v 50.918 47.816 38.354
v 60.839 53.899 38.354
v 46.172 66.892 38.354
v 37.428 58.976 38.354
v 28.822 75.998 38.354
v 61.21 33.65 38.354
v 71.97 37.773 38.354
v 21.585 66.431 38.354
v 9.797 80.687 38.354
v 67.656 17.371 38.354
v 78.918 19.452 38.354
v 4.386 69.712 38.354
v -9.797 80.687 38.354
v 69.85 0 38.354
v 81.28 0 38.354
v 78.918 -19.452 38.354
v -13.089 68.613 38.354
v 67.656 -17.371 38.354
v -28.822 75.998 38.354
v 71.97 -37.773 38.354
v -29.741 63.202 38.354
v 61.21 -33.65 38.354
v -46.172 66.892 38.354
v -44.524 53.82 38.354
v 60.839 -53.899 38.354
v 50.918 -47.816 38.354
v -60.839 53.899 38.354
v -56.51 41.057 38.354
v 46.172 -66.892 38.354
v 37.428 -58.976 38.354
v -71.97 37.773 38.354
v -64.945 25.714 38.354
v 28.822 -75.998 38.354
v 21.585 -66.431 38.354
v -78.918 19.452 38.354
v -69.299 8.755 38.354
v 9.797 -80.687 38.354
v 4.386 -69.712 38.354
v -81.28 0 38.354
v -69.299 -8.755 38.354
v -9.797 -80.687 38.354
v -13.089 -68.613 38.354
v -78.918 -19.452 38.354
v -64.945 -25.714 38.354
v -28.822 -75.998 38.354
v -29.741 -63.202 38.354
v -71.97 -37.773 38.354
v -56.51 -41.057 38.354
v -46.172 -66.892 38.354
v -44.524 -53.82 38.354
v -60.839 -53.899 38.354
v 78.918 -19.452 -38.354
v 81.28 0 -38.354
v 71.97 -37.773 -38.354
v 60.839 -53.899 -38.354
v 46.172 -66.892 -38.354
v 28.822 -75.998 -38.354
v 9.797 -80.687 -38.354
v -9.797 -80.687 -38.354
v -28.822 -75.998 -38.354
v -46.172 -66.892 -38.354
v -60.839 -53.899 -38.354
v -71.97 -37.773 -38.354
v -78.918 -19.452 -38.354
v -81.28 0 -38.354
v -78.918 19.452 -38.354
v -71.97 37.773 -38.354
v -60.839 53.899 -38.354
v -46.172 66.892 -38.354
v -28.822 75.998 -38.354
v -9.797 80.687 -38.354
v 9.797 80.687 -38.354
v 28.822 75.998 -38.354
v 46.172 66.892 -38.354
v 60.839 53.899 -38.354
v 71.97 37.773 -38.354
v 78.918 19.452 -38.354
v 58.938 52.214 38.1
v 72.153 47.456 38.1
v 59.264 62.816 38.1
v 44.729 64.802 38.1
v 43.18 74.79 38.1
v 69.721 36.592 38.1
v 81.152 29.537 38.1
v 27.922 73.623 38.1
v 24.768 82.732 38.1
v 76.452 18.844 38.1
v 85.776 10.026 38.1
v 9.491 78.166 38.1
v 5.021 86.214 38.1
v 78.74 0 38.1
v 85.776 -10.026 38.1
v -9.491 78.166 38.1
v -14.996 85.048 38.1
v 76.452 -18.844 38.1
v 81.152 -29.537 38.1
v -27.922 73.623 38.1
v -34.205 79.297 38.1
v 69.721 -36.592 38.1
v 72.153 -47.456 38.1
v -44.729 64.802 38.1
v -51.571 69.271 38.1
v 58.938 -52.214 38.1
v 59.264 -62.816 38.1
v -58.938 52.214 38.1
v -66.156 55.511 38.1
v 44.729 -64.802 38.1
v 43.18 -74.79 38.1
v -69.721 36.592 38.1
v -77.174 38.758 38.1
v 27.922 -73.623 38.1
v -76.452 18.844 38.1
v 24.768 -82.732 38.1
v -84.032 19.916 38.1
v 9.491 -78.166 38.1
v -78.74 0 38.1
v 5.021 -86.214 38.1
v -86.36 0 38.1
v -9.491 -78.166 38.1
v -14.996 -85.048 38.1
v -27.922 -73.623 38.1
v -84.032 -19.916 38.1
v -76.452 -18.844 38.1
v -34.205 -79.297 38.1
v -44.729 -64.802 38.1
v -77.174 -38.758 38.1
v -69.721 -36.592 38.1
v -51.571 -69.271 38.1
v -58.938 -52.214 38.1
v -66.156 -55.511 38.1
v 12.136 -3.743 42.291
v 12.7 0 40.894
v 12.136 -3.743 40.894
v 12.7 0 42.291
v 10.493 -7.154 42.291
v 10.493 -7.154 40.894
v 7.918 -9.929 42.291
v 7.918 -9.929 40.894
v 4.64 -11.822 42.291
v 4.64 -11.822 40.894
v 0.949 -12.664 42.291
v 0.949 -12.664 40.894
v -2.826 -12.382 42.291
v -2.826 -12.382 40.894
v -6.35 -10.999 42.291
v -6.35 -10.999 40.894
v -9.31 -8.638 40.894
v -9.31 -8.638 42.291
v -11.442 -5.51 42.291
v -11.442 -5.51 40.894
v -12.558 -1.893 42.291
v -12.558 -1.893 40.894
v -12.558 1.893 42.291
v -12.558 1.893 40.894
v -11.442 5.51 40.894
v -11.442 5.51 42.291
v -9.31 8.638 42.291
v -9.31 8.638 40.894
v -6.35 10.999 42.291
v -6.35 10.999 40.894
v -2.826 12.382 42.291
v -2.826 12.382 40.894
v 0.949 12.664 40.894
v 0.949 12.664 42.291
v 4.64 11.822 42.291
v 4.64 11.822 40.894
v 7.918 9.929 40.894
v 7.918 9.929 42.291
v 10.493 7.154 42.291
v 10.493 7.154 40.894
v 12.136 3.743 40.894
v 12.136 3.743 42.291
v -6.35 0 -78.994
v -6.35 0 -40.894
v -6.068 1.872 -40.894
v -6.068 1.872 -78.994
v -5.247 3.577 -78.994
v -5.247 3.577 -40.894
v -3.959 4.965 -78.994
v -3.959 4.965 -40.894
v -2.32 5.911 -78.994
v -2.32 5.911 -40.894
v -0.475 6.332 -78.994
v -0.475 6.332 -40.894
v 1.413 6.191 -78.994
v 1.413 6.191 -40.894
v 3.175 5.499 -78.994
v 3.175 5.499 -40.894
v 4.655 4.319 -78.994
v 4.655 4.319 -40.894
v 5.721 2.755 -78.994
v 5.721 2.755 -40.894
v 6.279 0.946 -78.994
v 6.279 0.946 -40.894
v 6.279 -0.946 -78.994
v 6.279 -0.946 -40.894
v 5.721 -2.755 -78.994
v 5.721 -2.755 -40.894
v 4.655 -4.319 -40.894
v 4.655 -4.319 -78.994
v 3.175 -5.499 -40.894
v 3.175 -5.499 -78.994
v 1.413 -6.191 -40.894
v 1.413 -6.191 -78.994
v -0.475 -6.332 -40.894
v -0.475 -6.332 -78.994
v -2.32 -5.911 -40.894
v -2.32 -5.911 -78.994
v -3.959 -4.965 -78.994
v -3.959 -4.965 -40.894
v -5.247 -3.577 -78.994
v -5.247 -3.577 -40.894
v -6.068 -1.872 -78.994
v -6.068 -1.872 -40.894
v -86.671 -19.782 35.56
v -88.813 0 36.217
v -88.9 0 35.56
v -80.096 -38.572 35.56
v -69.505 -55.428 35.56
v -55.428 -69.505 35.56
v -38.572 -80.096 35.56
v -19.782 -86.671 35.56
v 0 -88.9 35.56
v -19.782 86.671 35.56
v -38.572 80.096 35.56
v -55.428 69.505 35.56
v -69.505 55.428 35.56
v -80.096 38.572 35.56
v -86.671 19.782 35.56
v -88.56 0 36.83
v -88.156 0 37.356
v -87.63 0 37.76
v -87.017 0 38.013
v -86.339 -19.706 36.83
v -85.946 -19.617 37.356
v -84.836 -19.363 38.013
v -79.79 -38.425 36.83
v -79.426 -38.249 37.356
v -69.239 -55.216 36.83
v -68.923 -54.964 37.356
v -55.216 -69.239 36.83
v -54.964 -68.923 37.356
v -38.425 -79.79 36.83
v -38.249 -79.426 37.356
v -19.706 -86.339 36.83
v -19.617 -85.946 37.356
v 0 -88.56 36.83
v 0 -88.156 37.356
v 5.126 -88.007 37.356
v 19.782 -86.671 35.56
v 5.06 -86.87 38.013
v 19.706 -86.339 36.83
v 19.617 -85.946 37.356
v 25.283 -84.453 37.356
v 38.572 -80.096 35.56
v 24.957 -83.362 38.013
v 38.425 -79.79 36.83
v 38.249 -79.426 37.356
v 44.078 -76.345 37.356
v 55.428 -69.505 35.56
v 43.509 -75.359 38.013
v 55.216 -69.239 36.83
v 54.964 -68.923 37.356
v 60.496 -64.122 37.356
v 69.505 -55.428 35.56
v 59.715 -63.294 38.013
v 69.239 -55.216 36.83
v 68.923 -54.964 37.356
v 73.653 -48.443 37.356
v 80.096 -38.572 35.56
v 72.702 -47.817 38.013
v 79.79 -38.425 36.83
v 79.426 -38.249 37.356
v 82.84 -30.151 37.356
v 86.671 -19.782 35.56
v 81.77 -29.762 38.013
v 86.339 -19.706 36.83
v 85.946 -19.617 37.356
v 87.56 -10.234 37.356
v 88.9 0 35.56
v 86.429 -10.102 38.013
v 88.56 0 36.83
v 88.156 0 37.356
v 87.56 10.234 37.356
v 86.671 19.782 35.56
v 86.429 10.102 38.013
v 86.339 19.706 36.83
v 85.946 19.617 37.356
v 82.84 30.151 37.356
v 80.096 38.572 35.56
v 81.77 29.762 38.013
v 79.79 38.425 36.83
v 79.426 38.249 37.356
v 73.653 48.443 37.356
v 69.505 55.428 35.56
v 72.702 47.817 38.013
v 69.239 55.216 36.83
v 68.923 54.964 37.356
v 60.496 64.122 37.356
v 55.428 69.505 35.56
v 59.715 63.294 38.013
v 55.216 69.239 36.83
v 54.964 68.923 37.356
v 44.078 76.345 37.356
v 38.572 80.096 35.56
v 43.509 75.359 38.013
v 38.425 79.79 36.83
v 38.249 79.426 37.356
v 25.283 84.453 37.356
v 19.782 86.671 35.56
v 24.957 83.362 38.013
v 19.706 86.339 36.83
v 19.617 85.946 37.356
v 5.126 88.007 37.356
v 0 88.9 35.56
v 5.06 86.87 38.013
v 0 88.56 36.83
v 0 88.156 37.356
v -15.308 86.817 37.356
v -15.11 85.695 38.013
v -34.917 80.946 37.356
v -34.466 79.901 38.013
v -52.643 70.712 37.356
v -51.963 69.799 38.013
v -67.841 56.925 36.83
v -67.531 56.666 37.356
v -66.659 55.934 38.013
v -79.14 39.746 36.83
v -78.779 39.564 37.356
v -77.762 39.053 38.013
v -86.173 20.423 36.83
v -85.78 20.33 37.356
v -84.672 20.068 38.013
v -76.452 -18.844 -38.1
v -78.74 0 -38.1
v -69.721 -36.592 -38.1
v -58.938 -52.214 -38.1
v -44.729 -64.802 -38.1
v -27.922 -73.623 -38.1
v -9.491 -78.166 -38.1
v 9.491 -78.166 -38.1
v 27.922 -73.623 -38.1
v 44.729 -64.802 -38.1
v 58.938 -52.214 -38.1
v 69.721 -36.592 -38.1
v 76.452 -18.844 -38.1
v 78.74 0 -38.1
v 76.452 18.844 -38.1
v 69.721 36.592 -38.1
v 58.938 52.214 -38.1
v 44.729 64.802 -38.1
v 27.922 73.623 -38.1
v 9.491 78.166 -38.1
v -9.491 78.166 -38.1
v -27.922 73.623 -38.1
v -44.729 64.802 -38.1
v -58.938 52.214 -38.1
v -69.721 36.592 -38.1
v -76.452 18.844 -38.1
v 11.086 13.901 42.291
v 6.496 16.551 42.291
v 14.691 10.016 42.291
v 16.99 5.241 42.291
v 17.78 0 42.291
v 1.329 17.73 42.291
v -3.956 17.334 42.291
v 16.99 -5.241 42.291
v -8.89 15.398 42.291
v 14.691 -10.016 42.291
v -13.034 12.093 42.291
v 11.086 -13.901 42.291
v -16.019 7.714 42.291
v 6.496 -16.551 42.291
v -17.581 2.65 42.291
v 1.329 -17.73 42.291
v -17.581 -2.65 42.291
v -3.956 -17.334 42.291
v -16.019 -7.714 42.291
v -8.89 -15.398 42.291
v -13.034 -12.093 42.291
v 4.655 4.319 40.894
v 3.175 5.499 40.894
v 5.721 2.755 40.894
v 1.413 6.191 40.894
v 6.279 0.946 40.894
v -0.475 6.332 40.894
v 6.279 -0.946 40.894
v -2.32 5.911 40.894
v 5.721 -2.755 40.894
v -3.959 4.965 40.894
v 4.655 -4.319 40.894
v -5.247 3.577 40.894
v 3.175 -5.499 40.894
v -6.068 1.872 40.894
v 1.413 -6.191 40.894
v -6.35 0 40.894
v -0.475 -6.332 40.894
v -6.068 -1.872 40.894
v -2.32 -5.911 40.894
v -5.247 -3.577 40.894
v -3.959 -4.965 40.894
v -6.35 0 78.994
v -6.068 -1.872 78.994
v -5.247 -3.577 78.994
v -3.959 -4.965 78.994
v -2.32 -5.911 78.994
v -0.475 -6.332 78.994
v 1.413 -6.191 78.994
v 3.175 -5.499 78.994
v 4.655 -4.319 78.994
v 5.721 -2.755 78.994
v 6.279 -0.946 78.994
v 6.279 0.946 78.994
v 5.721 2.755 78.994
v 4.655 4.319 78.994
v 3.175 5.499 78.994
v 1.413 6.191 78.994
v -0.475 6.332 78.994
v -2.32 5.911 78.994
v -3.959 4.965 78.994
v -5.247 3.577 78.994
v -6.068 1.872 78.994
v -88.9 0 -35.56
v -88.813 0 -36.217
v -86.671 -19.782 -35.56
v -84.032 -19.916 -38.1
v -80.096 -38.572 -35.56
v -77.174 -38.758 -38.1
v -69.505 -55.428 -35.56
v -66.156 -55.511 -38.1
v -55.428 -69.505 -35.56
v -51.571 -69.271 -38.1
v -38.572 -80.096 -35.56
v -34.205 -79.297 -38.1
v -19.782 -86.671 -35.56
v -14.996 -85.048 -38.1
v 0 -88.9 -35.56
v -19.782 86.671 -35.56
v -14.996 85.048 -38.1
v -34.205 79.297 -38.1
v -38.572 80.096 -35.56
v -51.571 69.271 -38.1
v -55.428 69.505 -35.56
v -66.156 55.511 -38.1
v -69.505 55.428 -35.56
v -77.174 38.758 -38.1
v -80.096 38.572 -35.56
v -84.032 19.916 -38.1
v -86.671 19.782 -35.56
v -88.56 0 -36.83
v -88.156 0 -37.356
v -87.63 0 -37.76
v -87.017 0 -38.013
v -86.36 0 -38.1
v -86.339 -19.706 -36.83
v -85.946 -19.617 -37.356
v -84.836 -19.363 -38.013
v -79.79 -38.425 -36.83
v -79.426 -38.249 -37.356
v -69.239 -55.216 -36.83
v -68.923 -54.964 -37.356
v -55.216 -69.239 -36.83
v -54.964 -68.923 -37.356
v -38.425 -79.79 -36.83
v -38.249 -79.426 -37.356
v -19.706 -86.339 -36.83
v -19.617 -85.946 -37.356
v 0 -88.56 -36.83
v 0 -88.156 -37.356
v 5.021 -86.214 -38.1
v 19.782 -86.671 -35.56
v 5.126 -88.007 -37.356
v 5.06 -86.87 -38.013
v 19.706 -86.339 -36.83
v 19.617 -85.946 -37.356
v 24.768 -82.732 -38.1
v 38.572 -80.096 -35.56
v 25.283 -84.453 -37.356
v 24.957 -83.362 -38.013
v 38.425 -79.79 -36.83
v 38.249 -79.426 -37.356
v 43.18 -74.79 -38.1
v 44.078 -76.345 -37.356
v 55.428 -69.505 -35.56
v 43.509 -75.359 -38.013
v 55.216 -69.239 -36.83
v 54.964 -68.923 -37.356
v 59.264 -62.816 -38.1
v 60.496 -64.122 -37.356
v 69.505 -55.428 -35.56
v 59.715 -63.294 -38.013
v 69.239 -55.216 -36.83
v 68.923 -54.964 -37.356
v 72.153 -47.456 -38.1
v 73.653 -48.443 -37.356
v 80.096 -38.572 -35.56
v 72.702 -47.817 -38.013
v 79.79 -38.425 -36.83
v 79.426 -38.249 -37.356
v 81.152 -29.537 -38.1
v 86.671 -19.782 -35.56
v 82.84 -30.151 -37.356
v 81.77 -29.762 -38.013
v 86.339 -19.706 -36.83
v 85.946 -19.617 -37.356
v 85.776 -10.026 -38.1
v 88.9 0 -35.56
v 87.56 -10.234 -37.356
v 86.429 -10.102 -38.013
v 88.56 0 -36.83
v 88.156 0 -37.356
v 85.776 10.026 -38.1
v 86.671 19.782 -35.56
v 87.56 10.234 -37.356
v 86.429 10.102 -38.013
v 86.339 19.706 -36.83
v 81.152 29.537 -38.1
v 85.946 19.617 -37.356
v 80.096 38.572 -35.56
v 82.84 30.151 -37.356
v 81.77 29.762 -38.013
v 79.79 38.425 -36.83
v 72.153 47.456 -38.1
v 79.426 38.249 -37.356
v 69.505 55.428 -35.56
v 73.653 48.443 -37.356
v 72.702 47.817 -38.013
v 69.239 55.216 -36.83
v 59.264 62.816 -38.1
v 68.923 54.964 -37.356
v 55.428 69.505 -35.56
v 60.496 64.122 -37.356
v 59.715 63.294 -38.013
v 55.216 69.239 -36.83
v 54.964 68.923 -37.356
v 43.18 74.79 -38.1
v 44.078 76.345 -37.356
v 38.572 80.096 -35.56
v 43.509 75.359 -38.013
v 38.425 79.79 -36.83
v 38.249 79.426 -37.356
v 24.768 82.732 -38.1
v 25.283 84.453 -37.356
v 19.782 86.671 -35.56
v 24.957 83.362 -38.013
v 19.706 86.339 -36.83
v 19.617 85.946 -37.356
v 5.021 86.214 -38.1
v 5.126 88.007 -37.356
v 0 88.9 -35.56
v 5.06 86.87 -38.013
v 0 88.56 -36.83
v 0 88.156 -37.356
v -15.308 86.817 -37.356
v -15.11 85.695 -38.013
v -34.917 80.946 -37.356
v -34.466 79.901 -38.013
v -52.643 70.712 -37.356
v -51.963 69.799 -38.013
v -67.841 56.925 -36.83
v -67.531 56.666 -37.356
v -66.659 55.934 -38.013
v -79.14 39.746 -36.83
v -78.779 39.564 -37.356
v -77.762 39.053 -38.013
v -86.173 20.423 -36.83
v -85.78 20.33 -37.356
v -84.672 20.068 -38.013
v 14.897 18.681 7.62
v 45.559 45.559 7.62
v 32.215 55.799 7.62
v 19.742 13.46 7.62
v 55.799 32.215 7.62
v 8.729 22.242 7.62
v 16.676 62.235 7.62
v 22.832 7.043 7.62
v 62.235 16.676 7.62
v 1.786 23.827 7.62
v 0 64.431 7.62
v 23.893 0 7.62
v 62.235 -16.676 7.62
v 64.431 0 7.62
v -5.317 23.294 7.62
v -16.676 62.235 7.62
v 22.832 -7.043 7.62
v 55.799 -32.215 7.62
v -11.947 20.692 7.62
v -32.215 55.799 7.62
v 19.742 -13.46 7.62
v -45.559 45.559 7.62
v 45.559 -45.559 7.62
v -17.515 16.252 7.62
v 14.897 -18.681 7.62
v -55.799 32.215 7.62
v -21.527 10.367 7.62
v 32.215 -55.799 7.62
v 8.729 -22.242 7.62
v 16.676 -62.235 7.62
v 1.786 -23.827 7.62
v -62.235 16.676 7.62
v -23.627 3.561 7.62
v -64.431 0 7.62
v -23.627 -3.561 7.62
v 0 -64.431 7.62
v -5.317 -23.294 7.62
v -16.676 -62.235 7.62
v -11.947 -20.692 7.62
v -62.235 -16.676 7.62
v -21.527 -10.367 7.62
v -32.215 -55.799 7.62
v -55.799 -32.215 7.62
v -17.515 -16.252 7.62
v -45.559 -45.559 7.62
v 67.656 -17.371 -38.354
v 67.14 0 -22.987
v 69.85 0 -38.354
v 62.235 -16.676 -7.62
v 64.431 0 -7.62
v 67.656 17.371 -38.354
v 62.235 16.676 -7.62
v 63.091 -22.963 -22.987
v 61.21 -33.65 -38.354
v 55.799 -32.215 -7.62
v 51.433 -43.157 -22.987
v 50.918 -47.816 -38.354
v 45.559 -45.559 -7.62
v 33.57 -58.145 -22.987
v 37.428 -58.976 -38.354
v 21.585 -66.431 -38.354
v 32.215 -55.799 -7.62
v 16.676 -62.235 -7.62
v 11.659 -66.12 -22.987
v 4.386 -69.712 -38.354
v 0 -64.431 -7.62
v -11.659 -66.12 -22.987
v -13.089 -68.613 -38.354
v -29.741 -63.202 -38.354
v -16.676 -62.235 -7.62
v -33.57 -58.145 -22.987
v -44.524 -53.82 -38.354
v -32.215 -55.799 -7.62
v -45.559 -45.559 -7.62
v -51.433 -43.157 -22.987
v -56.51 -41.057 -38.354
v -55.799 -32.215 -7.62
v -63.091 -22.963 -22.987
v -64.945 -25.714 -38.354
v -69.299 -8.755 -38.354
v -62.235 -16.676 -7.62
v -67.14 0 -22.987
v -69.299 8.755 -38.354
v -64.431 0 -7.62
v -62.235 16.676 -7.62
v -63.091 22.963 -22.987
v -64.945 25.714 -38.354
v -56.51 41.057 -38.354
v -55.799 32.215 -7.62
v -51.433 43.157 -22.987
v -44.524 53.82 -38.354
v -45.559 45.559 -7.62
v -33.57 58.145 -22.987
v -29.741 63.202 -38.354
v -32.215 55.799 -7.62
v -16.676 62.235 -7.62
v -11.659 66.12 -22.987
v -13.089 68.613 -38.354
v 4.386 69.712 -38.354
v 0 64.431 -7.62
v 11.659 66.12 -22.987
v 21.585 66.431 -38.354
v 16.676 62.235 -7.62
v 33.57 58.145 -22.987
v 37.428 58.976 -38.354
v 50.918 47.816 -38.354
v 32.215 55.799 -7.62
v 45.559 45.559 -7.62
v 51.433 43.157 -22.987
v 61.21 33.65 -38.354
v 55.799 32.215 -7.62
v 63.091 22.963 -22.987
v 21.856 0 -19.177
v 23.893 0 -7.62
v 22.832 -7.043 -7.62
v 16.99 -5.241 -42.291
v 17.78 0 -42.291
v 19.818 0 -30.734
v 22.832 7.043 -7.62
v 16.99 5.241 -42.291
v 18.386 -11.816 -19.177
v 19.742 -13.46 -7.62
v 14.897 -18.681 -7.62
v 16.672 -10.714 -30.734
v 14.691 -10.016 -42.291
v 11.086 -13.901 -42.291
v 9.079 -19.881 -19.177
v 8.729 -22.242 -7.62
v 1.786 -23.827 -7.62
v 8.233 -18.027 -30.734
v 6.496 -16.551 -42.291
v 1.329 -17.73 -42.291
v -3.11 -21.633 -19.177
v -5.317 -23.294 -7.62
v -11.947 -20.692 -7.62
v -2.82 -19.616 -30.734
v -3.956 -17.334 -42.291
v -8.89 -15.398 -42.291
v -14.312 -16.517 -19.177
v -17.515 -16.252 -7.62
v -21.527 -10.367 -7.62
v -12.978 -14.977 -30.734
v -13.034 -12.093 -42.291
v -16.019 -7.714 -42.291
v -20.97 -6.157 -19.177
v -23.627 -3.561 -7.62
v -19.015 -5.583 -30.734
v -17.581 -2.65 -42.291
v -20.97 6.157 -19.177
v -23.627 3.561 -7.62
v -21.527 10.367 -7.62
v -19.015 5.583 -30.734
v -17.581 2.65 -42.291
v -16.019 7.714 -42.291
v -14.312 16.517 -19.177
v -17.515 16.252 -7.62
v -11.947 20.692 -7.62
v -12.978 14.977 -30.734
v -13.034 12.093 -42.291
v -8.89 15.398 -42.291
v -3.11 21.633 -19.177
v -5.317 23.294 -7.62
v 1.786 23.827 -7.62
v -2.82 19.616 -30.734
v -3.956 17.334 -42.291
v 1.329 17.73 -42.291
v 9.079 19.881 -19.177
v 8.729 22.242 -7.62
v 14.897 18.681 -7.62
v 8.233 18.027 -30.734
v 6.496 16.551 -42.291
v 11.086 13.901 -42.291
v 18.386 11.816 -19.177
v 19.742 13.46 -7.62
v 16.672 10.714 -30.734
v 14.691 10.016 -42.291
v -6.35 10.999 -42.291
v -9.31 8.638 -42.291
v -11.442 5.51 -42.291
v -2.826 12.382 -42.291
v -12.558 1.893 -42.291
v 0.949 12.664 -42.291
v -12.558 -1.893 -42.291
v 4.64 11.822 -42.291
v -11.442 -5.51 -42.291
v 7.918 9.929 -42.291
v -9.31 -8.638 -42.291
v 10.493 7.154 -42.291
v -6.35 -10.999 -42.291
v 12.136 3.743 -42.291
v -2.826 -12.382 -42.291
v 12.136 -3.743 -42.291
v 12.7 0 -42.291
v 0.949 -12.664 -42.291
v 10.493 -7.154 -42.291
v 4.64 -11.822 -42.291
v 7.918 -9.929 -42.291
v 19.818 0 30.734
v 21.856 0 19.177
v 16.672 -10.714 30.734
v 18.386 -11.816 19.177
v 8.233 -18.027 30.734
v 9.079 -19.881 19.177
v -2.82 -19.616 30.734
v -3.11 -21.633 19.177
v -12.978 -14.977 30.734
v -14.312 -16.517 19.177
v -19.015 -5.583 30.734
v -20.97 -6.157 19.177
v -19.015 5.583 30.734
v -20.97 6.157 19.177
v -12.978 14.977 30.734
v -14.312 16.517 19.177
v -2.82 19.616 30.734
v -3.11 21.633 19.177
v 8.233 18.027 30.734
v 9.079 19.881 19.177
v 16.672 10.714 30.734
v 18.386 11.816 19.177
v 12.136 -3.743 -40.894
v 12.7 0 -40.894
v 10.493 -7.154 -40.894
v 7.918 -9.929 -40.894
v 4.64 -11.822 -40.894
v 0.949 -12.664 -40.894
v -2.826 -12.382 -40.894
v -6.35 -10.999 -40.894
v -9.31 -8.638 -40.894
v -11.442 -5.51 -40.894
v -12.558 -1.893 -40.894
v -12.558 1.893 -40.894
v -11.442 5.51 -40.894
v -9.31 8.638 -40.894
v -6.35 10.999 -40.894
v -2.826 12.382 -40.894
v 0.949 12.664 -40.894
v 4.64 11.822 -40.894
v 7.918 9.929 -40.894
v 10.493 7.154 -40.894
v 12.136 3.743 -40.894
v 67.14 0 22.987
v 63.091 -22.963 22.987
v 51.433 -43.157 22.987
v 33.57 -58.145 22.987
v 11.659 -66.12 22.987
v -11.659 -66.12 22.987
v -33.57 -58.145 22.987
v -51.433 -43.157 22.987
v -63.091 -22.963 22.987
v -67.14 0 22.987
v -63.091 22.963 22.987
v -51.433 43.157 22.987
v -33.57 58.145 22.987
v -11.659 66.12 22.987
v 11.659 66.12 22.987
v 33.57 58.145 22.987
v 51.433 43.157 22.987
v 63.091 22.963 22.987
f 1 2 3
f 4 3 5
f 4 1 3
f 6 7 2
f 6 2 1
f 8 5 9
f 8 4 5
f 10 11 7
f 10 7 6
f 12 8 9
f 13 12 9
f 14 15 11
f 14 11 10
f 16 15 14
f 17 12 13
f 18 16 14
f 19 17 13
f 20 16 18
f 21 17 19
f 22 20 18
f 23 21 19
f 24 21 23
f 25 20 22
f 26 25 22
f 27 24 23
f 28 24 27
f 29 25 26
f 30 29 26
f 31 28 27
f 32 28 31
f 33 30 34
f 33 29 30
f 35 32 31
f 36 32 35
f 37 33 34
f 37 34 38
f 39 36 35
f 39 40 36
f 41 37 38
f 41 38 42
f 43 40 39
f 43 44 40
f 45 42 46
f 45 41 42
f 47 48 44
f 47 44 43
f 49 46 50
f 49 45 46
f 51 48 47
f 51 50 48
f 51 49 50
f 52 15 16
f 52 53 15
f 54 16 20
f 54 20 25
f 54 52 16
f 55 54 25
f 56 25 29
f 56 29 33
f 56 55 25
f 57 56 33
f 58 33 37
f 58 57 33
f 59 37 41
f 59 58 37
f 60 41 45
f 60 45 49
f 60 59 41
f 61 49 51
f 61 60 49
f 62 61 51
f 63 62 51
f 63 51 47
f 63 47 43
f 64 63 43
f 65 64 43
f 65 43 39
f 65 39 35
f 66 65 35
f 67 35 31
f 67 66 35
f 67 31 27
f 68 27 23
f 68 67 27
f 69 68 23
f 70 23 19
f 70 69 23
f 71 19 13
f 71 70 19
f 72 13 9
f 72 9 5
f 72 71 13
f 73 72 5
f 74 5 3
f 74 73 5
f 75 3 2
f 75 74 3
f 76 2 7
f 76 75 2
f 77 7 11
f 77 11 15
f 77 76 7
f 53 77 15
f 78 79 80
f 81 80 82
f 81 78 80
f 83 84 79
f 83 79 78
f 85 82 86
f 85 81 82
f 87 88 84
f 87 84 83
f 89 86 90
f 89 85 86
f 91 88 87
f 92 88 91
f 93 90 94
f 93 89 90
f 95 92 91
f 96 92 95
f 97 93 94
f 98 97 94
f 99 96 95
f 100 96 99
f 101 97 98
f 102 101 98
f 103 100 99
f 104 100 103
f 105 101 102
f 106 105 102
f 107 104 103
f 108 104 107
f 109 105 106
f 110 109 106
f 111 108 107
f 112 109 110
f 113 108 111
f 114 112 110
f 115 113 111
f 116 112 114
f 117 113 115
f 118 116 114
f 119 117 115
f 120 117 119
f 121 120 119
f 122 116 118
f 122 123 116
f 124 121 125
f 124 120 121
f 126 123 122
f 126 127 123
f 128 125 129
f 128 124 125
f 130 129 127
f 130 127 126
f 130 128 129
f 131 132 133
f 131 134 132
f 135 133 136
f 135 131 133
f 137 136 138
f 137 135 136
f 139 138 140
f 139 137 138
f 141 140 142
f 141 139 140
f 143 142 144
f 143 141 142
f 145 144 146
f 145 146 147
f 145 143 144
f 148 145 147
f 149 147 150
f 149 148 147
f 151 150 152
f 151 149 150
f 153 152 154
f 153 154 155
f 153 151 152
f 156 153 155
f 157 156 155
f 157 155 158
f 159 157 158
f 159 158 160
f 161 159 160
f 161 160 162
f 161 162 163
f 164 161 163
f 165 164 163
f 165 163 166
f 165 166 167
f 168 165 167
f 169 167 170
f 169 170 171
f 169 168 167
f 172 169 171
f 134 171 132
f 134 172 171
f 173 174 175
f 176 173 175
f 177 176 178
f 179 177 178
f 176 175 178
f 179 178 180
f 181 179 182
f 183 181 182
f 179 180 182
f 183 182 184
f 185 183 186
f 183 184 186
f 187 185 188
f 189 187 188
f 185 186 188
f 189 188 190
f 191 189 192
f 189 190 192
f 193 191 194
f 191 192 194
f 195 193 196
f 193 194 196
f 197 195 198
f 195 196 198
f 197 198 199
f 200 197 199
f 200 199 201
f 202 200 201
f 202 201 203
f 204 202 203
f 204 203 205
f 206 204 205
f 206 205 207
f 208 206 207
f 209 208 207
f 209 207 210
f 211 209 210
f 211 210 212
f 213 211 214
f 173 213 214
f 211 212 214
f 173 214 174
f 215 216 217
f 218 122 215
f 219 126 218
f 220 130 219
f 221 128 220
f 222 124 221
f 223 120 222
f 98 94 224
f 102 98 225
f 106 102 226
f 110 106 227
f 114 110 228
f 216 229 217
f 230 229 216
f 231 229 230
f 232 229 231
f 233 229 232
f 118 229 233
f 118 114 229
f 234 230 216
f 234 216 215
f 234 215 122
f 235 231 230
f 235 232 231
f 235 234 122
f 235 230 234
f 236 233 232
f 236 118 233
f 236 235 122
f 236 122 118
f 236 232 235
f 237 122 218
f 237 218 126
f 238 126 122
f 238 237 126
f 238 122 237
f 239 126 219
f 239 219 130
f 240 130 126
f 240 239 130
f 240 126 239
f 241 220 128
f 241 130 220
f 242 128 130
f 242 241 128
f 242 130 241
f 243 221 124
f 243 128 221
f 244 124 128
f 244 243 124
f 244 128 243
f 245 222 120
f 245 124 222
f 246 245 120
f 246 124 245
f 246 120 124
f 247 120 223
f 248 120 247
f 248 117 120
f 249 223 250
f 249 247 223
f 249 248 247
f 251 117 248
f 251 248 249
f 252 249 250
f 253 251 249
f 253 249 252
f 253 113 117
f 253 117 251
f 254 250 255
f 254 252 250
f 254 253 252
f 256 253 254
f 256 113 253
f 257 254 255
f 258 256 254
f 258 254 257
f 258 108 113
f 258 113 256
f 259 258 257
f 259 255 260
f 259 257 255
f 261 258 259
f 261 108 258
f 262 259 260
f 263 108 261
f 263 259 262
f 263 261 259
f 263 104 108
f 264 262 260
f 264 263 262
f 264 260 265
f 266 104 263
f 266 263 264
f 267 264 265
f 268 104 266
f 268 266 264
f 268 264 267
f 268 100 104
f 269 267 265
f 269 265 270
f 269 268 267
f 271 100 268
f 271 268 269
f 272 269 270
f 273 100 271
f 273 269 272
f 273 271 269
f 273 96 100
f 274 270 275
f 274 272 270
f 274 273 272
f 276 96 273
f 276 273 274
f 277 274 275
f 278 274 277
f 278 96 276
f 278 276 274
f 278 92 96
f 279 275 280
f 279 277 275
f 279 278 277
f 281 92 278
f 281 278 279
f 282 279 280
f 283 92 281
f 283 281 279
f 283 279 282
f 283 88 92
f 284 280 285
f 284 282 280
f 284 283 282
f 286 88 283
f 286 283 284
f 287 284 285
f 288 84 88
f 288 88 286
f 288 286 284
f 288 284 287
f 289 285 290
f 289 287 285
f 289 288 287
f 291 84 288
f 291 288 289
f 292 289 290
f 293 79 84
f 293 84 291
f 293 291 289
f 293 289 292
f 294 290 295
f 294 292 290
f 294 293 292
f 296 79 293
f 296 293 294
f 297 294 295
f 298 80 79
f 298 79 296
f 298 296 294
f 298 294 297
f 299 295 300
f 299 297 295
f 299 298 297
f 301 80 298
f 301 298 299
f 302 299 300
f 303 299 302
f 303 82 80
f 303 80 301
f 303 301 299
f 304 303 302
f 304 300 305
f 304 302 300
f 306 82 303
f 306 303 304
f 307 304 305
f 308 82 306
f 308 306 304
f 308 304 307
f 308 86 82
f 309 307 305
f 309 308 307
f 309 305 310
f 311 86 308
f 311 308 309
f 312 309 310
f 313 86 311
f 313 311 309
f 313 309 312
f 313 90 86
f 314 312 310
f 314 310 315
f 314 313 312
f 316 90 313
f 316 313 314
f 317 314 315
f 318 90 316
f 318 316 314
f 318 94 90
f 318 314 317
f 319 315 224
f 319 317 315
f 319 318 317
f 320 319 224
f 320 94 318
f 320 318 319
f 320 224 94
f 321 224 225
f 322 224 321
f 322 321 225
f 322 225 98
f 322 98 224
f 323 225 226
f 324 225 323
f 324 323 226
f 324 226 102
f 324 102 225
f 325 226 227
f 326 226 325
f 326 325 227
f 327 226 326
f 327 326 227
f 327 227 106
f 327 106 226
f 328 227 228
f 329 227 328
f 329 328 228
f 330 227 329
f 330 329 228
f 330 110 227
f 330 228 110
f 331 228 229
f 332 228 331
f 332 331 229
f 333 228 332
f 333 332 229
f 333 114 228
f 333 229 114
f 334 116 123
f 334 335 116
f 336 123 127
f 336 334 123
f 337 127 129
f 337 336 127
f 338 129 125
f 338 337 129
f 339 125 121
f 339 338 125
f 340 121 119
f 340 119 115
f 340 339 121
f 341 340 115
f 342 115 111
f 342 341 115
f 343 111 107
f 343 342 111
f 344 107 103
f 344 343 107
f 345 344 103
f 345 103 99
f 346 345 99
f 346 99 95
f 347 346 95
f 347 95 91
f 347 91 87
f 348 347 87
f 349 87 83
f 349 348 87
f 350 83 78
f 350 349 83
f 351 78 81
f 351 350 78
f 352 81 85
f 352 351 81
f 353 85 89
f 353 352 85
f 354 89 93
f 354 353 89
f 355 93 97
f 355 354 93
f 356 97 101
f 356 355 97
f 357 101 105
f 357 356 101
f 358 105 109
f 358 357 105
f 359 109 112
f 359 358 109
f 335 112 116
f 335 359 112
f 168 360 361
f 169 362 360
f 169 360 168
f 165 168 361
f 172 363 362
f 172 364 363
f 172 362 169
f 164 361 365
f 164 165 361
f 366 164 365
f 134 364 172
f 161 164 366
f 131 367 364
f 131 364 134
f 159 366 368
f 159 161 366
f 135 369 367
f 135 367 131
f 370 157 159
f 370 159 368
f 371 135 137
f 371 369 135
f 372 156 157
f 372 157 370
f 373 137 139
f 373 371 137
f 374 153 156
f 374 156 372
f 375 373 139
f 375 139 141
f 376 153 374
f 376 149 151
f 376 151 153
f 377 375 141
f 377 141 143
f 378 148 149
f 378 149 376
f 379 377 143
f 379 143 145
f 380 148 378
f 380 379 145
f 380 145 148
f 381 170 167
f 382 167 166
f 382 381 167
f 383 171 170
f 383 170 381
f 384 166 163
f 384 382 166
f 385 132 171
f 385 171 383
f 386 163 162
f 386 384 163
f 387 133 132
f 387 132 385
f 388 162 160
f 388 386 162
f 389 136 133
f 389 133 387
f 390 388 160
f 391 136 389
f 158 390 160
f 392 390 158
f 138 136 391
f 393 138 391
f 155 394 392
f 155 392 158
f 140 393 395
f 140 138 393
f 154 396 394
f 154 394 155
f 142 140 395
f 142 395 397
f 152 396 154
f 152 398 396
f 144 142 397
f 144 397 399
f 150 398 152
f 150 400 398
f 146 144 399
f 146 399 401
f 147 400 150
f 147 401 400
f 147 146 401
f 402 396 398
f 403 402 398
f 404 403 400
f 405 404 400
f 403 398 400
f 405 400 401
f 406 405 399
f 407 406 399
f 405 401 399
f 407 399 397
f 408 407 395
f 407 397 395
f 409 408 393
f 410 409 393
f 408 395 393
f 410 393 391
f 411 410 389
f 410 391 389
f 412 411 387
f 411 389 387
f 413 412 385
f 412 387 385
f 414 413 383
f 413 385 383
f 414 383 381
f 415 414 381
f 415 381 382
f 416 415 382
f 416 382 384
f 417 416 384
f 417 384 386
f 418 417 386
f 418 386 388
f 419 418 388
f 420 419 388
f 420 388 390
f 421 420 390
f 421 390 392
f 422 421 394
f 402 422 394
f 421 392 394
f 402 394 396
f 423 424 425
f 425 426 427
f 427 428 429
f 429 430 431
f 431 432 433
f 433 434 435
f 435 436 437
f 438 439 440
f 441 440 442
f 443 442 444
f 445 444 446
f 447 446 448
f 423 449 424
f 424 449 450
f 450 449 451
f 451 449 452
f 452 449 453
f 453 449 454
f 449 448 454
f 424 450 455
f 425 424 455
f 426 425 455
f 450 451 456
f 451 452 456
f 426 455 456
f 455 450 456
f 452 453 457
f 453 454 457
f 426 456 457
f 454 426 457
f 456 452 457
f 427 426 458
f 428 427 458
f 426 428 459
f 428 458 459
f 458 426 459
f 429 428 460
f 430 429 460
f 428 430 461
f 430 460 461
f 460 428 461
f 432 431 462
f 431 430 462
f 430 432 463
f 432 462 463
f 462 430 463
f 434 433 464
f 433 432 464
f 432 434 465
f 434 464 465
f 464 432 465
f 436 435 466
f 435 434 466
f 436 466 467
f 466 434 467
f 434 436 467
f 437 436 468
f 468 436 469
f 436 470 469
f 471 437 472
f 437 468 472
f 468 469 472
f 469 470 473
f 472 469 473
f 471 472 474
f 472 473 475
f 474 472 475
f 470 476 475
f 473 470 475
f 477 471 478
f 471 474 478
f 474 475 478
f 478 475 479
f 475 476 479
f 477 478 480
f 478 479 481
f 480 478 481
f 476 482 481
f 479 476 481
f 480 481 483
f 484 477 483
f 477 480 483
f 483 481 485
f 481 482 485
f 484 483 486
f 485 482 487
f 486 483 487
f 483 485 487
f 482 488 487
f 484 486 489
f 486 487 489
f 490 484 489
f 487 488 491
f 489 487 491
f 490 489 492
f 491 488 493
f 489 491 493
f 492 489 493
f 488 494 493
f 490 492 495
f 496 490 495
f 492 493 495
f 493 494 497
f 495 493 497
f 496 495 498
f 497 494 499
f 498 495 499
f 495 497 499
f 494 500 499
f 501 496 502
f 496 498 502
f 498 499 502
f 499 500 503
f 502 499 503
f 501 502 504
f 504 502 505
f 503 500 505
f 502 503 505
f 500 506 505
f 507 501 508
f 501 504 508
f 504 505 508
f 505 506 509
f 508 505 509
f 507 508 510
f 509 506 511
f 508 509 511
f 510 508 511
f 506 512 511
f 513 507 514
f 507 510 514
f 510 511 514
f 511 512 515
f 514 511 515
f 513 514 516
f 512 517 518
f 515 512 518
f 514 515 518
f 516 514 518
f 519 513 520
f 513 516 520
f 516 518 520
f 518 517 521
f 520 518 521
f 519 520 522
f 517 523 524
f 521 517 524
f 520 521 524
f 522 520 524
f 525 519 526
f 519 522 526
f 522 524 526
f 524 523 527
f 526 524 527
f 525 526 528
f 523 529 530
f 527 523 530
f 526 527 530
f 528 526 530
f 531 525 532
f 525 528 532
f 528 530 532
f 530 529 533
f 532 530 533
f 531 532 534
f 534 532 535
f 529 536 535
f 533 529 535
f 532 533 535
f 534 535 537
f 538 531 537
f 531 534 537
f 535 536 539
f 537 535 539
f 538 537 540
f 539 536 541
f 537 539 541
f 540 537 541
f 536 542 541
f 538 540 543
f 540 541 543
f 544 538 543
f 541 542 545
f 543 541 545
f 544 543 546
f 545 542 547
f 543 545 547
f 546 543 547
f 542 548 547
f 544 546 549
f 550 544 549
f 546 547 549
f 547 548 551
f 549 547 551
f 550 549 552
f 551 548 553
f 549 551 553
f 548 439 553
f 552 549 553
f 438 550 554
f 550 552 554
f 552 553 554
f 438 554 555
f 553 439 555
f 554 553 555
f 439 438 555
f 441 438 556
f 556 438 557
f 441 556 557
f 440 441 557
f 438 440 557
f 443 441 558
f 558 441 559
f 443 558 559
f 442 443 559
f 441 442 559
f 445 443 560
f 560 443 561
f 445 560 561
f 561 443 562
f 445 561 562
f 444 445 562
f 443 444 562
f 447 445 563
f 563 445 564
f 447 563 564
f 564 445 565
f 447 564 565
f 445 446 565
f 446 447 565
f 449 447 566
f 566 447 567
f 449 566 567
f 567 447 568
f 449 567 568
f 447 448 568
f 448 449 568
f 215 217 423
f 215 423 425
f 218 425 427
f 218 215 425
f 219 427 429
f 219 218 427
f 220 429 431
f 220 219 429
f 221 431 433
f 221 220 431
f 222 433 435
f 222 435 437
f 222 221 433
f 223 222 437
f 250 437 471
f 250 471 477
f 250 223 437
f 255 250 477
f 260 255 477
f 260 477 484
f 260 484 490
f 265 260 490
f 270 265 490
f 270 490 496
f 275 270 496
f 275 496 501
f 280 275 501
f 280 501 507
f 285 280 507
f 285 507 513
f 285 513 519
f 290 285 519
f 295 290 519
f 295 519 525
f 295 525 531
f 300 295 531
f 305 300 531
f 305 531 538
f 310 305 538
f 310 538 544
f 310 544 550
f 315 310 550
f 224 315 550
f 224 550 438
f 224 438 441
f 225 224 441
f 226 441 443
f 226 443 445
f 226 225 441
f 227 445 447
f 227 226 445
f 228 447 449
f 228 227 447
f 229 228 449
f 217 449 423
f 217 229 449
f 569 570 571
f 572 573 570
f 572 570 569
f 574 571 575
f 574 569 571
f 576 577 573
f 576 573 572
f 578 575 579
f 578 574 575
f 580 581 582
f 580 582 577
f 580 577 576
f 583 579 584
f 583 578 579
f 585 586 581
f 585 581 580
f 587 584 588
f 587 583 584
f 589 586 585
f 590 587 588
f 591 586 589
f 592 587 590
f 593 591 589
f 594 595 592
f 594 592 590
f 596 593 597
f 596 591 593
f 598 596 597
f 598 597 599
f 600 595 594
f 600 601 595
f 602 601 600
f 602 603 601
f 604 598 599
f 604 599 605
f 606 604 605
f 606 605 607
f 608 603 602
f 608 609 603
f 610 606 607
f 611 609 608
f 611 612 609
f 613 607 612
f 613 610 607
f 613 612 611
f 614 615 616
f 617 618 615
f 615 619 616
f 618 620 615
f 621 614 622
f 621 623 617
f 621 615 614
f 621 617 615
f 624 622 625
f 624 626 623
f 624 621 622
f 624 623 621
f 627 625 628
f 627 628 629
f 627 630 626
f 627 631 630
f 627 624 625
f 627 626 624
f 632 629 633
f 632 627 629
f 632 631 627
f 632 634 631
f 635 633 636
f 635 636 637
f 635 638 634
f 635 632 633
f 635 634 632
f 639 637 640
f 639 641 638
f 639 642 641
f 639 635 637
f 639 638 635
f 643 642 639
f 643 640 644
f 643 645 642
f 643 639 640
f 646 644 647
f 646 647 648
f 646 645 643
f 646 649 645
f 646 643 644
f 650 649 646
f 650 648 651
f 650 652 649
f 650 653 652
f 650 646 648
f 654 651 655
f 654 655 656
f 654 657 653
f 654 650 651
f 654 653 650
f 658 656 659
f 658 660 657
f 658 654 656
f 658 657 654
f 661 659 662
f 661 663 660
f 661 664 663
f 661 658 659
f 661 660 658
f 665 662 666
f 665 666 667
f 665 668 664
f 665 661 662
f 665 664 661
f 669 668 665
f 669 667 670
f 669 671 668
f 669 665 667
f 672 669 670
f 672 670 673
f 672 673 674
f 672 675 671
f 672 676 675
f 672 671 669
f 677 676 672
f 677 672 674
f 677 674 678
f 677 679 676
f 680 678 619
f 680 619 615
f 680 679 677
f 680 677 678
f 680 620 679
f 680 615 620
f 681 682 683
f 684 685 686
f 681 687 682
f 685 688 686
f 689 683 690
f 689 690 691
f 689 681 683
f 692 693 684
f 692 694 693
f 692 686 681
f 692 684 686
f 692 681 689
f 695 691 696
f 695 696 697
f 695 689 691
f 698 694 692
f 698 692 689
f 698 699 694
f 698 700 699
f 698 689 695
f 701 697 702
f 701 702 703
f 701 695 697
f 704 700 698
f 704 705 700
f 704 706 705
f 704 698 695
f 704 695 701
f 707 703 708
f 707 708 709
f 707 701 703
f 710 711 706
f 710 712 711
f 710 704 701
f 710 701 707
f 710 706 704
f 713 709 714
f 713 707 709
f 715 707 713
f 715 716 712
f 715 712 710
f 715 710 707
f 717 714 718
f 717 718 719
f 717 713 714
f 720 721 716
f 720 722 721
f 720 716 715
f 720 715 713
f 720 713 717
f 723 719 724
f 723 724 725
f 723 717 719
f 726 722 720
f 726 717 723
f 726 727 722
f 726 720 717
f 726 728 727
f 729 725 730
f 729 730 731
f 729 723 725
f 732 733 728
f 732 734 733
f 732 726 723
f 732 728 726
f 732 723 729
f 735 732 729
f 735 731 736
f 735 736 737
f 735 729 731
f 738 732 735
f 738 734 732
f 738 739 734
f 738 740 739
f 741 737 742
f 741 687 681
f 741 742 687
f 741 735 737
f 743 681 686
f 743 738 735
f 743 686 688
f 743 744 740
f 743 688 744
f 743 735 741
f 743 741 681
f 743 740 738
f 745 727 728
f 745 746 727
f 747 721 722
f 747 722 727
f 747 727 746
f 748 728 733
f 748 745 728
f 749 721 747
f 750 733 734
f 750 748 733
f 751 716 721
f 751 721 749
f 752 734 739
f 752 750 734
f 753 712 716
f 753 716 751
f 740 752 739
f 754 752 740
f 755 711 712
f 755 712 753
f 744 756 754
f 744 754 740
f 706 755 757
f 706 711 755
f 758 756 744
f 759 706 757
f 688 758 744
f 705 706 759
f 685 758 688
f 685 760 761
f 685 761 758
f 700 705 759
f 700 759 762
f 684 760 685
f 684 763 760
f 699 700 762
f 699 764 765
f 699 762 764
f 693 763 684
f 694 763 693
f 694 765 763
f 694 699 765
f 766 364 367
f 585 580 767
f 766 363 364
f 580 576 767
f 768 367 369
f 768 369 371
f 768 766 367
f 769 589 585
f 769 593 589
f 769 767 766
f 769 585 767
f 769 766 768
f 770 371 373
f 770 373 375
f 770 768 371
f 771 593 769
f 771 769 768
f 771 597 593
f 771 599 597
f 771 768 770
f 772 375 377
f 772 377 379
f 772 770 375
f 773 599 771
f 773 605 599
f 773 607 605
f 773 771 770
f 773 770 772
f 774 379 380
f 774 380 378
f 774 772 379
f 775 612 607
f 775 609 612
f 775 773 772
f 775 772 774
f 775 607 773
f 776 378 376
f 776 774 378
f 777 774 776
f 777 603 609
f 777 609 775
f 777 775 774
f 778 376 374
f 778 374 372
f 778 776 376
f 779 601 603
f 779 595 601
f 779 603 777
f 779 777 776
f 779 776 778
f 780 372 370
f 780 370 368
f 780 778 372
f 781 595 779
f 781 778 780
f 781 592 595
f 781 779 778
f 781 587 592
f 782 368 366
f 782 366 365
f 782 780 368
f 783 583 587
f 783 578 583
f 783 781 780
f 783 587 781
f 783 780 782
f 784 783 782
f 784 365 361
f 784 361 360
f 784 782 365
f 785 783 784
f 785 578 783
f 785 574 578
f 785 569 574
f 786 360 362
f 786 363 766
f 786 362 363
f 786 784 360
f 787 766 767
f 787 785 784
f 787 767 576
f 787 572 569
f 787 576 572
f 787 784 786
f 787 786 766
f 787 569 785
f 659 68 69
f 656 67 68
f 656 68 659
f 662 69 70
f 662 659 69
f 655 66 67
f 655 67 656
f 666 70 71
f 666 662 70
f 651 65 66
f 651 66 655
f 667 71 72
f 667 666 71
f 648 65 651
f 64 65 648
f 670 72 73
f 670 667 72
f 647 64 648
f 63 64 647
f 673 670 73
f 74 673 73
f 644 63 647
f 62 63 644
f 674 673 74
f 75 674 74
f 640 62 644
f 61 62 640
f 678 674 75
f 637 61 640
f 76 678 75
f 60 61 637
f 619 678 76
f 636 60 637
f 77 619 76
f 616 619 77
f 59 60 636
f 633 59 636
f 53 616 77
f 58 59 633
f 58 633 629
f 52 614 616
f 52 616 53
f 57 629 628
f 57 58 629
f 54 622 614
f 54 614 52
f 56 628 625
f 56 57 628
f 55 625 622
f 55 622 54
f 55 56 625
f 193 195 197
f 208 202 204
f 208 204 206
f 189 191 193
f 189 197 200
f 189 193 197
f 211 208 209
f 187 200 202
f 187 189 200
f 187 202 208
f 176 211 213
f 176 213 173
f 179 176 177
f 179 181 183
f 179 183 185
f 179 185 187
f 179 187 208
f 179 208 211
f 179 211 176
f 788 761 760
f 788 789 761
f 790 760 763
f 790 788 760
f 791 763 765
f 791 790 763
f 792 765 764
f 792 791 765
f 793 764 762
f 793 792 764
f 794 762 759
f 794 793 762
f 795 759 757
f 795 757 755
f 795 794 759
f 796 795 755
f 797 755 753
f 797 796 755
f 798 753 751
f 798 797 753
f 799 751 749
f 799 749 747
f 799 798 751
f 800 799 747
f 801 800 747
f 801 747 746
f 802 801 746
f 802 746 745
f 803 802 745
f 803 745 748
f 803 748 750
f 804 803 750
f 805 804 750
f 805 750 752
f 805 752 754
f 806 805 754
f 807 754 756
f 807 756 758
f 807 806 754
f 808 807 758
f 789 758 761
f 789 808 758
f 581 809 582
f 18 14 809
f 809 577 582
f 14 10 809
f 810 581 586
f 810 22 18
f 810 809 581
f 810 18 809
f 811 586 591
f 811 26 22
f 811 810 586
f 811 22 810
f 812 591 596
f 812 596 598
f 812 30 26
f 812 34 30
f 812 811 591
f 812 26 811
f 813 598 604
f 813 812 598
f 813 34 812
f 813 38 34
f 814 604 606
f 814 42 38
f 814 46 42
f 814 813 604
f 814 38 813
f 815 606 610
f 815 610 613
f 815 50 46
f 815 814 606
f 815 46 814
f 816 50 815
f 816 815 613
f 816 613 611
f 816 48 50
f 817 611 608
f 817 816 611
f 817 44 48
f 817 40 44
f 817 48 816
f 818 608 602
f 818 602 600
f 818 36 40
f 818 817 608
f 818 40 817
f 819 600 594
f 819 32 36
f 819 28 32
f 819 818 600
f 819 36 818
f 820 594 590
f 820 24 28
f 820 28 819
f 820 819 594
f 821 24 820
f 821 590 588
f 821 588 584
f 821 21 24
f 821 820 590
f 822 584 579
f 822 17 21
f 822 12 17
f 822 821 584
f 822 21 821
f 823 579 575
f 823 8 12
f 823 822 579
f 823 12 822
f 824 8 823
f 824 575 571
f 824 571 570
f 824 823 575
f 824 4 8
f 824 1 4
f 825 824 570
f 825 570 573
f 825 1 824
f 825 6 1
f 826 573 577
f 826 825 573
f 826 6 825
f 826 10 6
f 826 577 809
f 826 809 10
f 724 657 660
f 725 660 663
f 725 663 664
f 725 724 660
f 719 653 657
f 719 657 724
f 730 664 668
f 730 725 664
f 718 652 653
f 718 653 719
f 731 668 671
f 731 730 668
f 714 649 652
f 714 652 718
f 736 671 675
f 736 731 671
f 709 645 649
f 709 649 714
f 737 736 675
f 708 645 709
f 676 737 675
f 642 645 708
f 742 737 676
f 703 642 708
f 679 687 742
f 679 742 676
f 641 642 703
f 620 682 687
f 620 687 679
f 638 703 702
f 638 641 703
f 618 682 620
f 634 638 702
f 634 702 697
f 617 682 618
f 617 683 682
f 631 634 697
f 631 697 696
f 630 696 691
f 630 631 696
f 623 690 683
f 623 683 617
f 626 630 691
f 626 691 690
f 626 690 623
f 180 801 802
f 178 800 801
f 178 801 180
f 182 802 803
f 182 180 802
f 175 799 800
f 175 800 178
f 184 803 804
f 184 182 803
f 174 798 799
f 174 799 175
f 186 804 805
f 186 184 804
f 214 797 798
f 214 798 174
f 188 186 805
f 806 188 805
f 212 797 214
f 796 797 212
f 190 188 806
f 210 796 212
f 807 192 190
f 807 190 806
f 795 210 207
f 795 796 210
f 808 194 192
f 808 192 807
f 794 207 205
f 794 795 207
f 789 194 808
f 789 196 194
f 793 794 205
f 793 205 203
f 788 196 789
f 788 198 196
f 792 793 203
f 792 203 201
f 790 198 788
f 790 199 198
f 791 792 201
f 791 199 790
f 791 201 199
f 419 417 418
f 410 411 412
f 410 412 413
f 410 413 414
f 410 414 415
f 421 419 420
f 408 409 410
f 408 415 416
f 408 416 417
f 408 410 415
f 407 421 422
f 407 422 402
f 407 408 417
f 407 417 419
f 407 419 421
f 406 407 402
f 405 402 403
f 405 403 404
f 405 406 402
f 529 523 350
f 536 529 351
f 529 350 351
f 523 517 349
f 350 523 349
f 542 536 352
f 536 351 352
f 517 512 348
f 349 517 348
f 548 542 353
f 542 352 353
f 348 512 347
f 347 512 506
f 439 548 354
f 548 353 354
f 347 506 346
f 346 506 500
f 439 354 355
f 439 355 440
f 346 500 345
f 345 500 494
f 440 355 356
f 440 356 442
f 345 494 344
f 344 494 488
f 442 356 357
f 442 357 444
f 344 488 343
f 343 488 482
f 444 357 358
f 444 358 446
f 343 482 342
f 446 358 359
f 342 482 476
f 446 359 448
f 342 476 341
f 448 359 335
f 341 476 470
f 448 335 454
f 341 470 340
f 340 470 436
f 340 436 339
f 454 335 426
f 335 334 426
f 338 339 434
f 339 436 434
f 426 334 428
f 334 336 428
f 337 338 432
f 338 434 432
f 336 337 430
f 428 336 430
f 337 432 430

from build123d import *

# Parameters (mm, degrees)
SKETCH1_R           = 88.9
SKETCH1_R_2         = 78.74
BOSS_EXTRUDE1_DEPTH = 38.1
FILLET1_R           = 2.54
SKETCH8_R           = 6.35
BOSS_EXTRUDE2_DEPTH = 38.1
SKETCH11_R          = 6.35
BOSS_EXTRUDE3_DEPTH = 38.1


with BuildPart() as part:
    # Sketch1 → Boss-Extrude1 (new, symmetric)
    with BuildSketch(Plane.XY):
        with Locations(Location((0, 0, 0), (0, 0, 180))):
            Circle(SKETCH1_R)
        with Locations(Location((0, 0, 0), (0, 0, 180))):
            Circle(SKETCH1_R_2, mode=Mode.SUBTRACT)
    extrude(amount=BOSS_EXTRUDE1_DEPTH, both=True)

    # Fillet1
    fillet1_edges = [part.edges().sort_by_distance(p)[0] for p in [
        (88.9, 0, -38.1),
        (88.9, 0, 38.1),
    ]]
    fillet(fillet1_edges, radius=FILLET1_R)


with BuildPart() as body_2:
    # Sketch3 → Revolve1 (revolve)
    with BuildSketch(Plane(origin=(0, 0, 0), x_dir=(1, 0, 0), z_dir=(0, 1, 0)), mode=Mode.PRIVATE) as revolve1_sk:
        Polygon((0, 40.894), (0, -40.894), (-12.7, -40.894), (-12.7, -42.291), (-17.78, -42.291), (-23.893432748, -7.62), (-64.430766575, -7.62), (-69.85, -38.354), (-81.28, -38.354), (-81.28, 38.354), (-69.85, 38.354), (-64.430766575, 7.62), (-23.893432748, 7.62), (-17.78, 42.291), (-12.7, 42.291), (-12.7, 40.894), align=None)
    revolve(revolve1_sk.sketch.rotate(Axis((0, 0, 0), (0, 0, -1)), 180), axis=Axis((0, 0, 0), (0, 0, -1)))

    # Sketch8 → Boss-Extrude2 (add)
    with BuildSketch(Plane.XY.offset(40.894)):
        with Locations(Location((0, 0, 0), (0, 0, 180))):
            Circle(SKETCH8_R)
    extrude(amount=BOSS_EXTRUDE2_DEPTH)

    # Sketch11 → Boss-Extrude3 (add)
    with BuildSketch(Plane(origin=(0, 0, -40.894), x_dir=(-1, 0, 0), z_dir=(0, 0, -1))):
        Circle(SKETCH11_R)
    extrude(amount=BOSS_EXTRUDE3_DEPTH)


solid = Compound([part.part, body_2.part])
